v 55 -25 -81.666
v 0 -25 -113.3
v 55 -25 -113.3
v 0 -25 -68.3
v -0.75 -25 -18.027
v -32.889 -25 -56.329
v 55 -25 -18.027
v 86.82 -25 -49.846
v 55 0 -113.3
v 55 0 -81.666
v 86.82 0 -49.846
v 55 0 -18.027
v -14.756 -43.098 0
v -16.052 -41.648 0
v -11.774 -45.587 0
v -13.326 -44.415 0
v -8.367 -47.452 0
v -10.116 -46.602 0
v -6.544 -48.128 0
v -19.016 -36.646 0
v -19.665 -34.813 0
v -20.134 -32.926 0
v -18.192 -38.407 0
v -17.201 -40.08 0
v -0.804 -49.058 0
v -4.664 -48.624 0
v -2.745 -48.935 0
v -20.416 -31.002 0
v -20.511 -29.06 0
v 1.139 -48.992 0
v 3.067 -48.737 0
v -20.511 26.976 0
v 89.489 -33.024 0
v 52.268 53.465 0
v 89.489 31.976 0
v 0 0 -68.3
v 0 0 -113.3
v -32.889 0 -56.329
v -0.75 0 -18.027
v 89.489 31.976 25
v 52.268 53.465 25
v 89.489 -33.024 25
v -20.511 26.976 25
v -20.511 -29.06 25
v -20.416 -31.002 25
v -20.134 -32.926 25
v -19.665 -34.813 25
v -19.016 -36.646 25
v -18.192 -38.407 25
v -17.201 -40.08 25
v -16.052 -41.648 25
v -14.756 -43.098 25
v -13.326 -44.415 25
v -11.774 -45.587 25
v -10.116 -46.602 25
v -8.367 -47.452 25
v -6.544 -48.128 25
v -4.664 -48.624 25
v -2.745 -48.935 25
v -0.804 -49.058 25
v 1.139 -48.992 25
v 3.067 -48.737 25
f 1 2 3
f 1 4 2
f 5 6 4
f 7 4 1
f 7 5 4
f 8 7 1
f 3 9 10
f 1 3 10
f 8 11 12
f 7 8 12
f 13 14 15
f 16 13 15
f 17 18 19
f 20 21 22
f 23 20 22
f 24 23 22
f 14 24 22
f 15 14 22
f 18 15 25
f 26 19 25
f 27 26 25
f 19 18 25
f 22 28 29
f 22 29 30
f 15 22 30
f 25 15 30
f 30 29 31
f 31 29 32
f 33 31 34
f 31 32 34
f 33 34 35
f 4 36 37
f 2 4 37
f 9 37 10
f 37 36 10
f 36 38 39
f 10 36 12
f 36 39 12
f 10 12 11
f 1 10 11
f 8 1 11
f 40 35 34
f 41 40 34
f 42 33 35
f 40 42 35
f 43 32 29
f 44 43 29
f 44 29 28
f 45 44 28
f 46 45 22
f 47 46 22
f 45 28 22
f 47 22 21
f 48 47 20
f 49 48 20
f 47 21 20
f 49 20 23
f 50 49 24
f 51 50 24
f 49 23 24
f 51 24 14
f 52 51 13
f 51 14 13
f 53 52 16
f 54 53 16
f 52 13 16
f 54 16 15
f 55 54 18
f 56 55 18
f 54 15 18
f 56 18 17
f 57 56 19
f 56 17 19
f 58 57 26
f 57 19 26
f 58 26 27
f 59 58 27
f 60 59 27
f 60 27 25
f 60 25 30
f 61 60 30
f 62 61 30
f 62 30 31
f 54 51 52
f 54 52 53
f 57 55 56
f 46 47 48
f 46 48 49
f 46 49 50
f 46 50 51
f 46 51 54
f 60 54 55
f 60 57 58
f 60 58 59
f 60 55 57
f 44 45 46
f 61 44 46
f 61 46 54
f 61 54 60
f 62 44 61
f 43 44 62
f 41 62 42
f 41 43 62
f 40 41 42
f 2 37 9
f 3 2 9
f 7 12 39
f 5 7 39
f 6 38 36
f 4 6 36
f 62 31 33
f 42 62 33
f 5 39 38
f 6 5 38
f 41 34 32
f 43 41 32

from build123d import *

# Parameters (mm, degrees)
F1_DEPTH = 25
F3_DEPTH = 25


with BuildPart() as f1:
    # F0 (on Top) → F1 (new body)
    with BuildSketch(Plane.XY):
        with BuildLine():
            Line((89.489246, -33.024196), (89.489246, 31.975804))
            Line((89.489246, 31.975804), (52.268421, 53.465258))
            Line((52.268421, 53.465258), (-20.510754, 26.975804))
            Line((-20.510754, 26.975804), (-20.510754, -29.059941))
            ThreePointArc((-20.510754, -29.059941), (-13.325702, -44.414976), (3.066955, -48.737339))
            Line((3.066955, -48.737339), (89.489246, -33.024196))
        make_face()
    extrude(amount=F1_DEPTH)


with BuildPart() as f3:
    # F2 (on Front) → F3 (new body)
    with BuildSketch(Plane.XZ):
        Polygon((0, -113.299534), (55, -113.299534), (55.000139, -81.666217), (86.819944, -49.846412), (55.000139, -18.026607), (-0.749861, -18.026607), (-32.889242, -56.328829), (0, -68.299534), align=None)
    extrude(amount=F3_DEPTH)


solid = Compound([f1.part, f3.part])
